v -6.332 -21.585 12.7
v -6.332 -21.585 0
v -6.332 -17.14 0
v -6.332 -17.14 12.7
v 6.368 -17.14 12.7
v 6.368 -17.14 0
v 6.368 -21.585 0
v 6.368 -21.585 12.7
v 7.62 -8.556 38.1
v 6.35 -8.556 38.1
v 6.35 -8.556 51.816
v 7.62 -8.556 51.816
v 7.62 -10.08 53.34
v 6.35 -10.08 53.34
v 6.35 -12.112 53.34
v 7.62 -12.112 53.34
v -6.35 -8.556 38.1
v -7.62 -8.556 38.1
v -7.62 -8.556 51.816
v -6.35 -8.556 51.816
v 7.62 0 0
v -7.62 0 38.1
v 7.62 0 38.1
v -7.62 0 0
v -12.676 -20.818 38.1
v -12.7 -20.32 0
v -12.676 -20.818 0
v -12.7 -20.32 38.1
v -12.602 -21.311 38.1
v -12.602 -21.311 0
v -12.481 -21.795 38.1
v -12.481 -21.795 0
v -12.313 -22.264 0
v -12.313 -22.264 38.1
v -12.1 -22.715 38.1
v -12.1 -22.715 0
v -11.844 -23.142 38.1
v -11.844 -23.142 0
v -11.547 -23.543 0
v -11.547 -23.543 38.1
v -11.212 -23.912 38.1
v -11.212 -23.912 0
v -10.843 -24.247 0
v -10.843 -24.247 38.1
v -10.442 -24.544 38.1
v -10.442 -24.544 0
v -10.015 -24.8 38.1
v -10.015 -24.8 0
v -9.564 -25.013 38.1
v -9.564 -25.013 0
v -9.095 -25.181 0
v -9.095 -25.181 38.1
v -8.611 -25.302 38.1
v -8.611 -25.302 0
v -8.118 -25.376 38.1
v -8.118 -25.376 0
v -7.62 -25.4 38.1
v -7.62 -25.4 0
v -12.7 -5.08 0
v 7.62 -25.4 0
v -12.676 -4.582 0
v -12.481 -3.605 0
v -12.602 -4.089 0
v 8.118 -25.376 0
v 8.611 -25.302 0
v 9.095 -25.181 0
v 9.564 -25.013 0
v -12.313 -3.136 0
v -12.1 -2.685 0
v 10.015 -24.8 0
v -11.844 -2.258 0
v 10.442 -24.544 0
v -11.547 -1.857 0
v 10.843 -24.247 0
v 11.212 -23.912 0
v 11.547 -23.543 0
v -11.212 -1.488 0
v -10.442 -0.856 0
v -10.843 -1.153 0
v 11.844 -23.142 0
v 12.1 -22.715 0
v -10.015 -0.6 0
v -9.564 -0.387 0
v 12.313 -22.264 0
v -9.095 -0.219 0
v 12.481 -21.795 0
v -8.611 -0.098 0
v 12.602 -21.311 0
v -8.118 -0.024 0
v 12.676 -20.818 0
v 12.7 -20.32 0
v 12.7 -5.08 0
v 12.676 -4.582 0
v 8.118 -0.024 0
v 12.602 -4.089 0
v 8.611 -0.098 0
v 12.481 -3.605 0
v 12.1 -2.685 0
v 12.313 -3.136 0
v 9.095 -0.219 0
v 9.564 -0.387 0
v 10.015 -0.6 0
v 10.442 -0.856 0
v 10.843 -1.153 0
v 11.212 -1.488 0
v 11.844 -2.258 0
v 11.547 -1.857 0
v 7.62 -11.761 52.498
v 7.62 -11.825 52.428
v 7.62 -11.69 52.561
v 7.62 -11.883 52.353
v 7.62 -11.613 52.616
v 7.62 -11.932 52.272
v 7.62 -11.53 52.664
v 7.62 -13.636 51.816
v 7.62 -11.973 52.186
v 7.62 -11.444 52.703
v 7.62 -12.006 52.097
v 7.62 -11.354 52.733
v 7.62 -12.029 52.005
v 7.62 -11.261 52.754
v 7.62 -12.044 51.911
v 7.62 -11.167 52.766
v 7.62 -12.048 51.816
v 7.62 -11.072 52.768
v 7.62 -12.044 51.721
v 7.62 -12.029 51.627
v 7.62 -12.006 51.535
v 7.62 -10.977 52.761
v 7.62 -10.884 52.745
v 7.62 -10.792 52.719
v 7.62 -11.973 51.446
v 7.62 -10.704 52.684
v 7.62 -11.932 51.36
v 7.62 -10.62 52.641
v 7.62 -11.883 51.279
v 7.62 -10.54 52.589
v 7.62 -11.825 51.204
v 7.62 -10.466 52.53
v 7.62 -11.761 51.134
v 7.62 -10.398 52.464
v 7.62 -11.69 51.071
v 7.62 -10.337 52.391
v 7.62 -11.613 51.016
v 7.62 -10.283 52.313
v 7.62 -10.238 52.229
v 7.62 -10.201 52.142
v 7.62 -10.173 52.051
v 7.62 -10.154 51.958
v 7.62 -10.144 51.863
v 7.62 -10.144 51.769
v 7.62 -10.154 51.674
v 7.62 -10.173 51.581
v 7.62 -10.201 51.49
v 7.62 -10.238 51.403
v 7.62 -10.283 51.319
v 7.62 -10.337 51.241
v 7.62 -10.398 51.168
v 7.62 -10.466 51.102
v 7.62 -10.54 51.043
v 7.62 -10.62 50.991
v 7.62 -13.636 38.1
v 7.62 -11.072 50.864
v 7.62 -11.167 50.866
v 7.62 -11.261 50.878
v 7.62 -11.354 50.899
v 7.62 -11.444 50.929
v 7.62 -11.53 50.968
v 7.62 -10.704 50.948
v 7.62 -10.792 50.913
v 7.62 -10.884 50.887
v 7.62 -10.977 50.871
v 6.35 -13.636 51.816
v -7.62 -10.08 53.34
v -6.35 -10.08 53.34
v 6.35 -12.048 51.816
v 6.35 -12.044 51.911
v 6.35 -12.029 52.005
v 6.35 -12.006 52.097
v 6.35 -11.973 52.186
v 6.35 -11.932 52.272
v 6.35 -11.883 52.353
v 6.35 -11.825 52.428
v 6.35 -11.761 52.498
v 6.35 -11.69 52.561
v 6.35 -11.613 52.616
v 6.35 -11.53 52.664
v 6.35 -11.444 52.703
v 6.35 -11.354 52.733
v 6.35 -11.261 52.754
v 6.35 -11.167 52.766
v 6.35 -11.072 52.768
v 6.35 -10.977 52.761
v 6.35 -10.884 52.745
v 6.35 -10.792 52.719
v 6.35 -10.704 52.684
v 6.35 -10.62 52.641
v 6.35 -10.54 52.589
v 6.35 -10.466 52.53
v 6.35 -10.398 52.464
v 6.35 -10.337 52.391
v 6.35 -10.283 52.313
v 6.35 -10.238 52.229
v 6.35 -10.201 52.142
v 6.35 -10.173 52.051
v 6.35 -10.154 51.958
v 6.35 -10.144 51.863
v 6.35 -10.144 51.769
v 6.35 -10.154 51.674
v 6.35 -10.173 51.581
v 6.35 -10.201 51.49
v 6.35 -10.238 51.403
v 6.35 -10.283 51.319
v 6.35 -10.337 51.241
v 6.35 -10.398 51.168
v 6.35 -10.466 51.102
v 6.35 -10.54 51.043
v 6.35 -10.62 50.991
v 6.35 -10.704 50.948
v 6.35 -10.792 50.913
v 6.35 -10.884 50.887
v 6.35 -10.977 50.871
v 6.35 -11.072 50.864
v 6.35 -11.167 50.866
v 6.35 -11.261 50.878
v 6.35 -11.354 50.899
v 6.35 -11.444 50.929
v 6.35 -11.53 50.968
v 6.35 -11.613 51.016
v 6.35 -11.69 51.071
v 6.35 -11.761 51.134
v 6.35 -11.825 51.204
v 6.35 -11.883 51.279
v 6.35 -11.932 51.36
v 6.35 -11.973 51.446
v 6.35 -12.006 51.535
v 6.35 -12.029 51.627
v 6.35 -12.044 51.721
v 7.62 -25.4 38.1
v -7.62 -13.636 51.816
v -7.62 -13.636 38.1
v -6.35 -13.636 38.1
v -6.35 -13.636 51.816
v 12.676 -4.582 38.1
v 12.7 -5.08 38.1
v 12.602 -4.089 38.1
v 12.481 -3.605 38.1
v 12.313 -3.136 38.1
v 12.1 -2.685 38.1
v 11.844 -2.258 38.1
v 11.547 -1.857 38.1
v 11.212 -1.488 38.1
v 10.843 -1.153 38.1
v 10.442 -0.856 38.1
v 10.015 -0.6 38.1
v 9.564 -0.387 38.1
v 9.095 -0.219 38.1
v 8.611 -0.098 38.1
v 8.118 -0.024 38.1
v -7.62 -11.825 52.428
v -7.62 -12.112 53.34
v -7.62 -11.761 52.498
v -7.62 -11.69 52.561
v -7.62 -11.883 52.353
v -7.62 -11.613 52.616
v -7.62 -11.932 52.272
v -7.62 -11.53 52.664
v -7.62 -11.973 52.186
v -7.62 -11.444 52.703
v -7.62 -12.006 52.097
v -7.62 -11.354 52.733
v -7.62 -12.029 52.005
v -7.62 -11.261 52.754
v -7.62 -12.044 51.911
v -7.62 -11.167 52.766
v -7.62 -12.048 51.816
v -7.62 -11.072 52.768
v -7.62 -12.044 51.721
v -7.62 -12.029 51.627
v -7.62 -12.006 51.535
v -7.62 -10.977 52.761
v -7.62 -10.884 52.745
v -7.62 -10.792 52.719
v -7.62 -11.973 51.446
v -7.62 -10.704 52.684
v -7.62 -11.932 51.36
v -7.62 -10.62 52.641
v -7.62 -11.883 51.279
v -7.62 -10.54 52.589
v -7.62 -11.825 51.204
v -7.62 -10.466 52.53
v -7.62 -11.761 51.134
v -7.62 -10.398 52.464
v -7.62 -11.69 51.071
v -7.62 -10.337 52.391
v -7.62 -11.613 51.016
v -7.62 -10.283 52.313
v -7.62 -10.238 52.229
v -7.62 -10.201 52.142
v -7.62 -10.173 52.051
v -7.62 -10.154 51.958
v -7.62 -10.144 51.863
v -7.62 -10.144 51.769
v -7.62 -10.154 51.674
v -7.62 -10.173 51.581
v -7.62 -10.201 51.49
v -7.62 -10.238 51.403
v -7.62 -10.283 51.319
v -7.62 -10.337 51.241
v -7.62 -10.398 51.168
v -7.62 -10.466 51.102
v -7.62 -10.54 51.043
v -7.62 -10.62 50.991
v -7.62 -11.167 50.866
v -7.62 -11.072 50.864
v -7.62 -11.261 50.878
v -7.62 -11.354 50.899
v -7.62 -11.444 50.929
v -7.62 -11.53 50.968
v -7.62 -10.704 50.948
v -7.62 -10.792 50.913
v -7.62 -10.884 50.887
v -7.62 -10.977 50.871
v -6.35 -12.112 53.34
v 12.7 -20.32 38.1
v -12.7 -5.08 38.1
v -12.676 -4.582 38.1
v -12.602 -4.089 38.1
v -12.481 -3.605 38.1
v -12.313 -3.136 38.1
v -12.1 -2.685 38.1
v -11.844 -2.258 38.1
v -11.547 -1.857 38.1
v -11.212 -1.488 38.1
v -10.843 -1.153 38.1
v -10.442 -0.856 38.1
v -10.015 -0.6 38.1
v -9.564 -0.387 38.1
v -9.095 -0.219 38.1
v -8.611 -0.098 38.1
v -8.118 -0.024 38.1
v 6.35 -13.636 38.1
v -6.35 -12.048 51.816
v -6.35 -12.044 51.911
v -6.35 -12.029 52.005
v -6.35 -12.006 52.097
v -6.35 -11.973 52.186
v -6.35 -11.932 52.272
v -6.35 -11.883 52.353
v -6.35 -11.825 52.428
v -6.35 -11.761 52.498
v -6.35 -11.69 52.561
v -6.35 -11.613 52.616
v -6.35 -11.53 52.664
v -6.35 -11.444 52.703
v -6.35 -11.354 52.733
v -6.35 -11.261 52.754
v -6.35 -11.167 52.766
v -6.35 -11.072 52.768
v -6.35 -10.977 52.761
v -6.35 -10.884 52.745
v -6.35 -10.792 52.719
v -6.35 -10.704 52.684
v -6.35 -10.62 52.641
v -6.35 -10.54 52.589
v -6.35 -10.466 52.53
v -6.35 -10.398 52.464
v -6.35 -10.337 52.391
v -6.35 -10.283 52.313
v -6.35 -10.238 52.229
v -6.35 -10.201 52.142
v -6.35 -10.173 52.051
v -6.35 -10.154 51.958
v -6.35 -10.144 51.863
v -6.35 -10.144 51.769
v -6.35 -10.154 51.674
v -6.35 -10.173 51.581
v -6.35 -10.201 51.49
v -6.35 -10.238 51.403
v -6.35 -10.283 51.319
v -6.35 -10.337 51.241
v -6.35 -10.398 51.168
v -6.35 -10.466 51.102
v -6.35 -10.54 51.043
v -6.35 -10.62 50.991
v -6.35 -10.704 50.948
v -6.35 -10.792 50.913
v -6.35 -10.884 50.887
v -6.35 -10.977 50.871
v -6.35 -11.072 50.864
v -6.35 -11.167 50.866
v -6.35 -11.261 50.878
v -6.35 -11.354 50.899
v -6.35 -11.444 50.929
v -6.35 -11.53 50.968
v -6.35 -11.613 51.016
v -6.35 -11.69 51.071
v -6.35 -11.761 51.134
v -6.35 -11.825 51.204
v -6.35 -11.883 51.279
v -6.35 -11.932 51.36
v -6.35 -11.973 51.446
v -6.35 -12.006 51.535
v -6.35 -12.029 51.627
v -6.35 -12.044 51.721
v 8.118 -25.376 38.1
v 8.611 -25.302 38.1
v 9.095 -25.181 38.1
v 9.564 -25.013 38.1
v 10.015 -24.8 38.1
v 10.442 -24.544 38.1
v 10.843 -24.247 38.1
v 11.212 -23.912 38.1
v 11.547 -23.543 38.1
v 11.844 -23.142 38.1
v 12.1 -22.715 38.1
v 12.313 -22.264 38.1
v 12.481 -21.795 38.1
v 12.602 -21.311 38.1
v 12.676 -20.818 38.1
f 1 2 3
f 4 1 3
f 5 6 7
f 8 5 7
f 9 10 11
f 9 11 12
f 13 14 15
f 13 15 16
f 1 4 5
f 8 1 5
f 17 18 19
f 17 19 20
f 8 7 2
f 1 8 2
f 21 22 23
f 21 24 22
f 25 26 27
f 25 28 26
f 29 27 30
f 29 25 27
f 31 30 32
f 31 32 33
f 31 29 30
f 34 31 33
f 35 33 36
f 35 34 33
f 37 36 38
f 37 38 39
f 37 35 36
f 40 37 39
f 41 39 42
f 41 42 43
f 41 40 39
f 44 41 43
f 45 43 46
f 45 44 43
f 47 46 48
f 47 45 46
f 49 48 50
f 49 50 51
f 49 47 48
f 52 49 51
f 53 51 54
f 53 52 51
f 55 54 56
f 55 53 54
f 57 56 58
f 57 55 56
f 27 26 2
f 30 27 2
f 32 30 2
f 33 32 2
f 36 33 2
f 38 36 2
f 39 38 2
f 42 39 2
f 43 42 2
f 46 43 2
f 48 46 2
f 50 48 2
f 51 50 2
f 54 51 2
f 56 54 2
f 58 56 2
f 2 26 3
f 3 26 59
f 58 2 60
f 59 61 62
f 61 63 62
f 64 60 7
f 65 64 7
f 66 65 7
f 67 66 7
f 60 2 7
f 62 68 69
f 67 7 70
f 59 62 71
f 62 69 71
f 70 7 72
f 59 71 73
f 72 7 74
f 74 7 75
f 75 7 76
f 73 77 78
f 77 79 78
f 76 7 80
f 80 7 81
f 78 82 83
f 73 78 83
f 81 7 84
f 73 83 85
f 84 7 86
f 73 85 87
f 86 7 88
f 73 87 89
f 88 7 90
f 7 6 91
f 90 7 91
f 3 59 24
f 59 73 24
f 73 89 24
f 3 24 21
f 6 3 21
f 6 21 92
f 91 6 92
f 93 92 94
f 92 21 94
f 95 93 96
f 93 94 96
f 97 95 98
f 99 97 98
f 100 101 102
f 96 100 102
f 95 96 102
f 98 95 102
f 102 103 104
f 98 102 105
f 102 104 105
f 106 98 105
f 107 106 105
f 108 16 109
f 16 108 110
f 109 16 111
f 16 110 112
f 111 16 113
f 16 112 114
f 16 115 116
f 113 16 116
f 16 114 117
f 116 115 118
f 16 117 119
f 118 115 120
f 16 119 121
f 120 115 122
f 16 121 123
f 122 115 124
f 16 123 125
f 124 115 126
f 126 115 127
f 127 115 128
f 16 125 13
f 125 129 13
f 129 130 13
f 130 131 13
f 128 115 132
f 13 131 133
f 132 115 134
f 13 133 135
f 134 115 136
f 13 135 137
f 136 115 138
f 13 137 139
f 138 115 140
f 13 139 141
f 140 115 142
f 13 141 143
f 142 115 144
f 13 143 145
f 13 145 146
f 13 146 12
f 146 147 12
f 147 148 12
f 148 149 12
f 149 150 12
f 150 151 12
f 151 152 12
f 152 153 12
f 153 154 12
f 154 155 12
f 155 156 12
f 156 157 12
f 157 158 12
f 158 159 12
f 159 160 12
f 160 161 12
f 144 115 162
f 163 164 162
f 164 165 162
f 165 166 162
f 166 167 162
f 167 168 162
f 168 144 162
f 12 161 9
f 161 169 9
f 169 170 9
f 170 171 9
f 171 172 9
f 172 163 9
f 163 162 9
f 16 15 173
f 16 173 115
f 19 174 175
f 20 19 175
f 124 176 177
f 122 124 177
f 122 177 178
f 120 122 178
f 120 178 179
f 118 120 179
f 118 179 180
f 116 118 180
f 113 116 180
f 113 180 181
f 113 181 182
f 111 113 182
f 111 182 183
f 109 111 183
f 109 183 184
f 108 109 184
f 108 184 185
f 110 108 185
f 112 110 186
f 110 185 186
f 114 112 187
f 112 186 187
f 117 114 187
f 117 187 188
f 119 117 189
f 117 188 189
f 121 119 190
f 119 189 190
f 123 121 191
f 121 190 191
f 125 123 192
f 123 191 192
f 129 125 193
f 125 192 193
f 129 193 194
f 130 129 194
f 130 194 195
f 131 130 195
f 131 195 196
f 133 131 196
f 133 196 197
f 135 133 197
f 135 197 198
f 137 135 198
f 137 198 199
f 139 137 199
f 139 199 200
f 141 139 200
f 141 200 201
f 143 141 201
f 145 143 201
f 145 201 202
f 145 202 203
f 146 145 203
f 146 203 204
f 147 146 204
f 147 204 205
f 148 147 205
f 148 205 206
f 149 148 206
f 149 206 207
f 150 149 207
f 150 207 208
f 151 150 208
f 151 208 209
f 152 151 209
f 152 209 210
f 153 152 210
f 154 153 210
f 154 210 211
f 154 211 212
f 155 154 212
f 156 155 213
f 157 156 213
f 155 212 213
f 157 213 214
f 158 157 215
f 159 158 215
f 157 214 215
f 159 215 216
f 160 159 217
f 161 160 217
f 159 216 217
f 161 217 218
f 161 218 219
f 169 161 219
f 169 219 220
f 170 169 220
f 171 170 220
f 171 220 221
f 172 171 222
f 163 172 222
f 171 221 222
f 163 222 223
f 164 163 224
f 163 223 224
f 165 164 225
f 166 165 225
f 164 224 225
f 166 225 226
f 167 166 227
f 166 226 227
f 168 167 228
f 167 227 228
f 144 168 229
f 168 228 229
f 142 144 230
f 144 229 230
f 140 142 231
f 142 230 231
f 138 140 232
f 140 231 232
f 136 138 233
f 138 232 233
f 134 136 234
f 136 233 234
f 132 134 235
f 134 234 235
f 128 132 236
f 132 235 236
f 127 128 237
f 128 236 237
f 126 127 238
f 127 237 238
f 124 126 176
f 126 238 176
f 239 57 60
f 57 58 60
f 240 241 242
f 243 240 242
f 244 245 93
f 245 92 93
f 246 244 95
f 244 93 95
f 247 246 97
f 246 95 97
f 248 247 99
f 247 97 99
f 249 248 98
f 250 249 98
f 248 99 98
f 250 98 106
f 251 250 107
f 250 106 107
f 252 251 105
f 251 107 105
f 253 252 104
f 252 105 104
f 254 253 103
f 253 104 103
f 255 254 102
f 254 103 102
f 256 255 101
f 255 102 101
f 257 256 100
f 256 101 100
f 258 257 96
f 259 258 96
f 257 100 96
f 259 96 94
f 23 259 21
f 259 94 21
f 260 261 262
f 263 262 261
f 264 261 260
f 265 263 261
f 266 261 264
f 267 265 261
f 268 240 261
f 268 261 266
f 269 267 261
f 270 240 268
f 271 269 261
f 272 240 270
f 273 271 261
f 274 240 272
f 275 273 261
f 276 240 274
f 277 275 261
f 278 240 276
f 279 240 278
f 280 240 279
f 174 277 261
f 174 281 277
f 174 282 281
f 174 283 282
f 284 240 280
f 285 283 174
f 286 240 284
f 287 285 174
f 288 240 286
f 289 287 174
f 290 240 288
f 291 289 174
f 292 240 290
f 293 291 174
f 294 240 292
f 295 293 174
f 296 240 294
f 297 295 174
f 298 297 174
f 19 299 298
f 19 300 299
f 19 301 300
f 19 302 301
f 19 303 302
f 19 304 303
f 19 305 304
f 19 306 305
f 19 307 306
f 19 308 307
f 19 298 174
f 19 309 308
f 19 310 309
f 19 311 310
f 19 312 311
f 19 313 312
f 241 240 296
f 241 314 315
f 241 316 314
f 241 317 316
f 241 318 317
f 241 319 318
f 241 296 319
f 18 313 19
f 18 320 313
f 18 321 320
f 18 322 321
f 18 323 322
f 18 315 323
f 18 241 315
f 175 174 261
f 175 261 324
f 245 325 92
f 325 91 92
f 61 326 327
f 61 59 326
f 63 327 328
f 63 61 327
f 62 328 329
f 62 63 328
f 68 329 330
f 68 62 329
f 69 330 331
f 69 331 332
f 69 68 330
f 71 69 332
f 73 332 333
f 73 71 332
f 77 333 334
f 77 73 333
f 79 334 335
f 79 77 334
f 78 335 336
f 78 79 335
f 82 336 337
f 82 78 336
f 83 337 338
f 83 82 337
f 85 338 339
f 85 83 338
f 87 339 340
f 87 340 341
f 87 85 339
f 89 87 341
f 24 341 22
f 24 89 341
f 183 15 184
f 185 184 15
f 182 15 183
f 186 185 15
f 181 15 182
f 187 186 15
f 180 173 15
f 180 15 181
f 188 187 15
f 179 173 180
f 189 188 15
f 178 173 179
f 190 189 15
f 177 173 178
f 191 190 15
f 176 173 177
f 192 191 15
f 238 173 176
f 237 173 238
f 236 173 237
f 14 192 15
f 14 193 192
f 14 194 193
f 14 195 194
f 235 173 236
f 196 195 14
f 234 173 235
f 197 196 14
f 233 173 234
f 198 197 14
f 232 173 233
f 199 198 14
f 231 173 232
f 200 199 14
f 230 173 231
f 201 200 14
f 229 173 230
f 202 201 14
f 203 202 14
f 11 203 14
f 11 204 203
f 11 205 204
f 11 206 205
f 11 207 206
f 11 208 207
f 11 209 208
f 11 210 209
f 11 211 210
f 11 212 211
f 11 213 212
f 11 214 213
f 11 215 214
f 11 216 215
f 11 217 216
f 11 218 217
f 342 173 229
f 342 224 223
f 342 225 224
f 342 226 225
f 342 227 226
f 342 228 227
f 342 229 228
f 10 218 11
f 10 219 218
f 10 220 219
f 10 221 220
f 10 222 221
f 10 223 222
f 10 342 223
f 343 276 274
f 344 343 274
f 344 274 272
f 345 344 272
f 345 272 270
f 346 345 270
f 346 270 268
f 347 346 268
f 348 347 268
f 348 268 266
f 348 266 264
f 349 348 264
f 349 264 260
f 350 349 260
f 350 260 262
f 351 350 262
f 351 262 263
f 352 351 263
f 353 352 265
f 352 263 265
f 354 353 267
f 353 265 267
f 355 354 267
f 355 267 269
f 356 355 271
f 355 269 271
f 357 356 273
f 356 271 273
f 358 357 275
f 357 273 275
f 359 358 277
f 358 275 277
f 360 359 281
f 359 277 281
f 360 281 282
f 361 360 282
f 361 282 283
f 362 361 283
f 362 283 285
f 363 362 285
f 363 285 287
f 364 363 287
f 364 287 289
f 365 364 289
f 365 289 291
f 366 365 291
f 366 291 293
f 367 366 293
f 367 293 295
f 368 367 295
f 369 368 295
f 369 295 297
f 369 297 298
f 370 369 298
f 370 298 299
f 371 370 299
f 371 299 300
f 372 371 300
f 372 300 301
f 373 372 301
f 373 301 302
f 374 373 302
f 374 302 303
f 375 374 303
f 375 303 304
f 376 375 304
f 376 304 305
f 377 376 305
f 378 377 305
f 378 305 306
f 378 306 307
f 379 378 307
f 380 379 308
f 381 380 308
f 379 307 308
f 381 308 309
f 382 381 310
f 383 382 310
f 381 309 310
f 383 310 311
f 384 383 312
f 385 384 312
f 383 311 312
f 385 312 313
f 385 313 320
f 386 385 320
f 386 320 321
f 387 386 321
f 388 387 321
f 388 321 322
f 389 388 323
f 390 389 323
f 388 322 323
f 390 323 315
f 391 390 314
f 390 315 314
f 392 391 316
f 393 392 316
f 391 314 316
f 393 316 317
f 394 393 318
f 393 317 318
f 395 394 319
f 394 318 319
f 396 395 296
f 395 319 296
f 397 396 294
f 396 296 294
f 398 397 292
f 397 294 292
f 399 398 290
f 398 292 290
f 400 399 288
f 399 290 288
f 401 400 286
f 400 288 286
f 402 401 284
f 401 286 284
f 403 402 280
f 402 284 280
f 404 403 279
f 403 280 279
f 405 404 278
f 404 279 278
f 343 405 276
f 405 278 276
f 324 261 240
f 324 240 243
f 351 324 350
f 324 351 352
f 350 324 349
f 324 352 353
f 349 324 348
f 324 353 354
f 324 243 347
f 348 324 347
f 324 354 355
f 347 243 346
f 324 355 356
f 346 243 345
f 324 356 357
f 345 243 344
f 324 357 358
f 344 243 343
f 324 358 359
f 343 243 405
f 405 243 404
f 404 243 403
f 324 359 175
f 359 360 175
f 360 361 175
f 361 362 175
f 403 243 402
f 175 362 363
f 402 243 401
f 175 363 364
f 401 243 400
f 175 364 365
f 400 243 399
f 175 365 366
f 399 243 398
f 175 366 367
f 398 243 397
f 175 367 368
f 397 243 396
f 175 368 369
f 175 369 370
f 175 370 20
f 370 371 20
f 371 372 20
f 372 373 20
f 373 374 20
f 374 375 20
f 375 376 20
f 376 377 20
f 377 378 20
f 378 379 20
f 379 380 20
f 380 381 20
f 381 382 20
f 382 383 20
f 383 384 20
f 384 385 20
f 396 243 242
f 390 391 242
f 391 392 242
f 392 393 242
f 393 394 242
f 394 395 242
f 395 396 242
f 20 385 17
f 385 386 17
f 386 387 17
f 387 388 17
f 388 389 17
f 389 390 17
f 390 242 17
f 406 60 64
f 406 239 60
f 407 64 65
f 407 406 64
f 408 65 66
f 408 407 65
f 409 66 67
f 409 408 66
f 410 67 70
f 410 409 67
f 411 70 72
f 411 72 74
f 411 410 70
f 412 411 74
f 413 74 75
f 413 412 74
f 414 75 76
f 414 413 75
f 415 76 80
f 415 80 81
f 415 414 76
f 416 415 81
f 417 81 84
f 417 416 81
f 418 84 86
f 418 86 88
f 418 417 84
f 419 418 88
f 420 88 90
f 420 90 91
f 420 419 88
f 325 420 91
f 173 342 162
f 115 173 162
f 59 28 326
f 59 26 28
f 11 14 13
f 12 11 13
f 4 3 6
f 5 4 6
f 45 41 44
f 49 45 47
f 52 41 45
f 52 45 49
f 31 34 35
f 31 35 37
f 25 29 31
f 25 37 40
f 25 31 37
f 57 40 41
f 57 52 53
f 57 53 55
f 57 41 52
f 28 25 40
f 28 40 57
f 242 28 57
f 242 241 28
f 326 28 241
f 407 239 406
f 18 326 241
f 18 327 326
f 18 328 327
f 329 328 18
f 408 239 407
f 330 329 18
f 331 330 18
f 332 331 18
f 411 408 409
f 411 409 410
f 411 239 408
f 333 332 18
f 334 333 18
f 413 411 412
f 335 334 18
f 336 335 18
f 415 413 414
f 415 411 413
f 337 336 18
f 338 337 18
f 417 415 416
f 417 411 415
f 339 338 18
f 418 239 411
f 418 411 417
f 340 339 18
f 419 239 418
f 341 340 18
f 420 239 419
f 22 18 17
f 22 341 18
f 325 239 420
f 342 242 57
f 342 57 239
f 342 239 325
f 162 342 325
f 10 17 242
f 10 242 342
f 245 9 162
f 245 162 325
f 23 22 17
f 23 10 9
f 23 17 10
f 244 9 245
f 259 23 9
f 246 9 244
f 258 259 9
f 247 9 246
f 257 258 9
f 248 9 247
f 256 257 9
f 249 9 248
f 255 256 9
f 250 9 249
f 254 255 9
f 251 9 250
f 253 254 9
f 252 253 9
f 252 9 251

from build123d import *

# Parameters (mm, degrees)
F1_DEPTH = 12.7
F2_W     = 25.4
F2_H     = 25.4
F3_DEPTH = 25.4
F4_R     = 5.08
F5_W     = 1.27
F5_H     = 5.08
F6_DEPTH = 15.24
F7_SIZE  = 1.524
F8_R     = 0.9525
F9_DEPTH = 127


with BuildPart() as f1:
    # F0 (on Top) → F1 (new body)
    with BuildSketch(Plane.XY):
        Polygon((-12.7, -25.4), (0, -25.4), (12.7, -25.4), (12.7, 0), (-12.7, 0), align=None)
        Polygon((6.368273, -21.585433), (0.018273, -21.585433), (-6.331727, -21.585433), (-6.331727, -17.140433), (6.368273, -17.140433), align=None, mode=Mode.SUBTRACT)
    extrude(amount=F1_DEPTH)

    # F2 (on face) → F3 (join)
    with BuildSketch(Plane.XY.offset(12.7)):
        with Locations((0, -12.7)):
            Rectangle(F2_W, F2_H)
    extrude(amount=F3_DEPTH)

    # F4
    f4_edges = [f1.edges().sort_by_distance(p)[0] for p in [
        (-12.7, -25.4, 19.05),
        (12.7, -25.4, 19.05),
        (-12.7, 0, 19.05),
        (12.7, 0, 19.05),
    ]]
    fillet(f4_edges, radius=F4_R)

    # F5 (on face) → F6 (join)
    with BuildSketch(Plane.XY.offset(38.1)):
        with Locations((-6.985, -11.095791)):
            Rectangle(F5_W, F5_H)
        with Locations((6.985, -11.095791)):
            Rectangle(F5_W, F5_H)
    extrude(amount=F6_DEPTH)

    # F7
    f7_edges = [f1.edges().sort_by_distance(p)[0] for p in [
        (-6.985, -13.635791, 53.34),
        (6.985, -13.635791, 53.34),
        (-6.985, -8.555791, 53.34),
        (6.985, -8.555791, 53.34),
    ]]
    chamfer(f7_edges, length=F7_SIZE)

    # F8 (on face) → F9 (cut)
    with BuildSketch(Plane(origin=(-7.62, 0, 0), x_dir=(0, -1, 0), z_dir=(-1, 0, 0))):
        with Locations((11.095791, 51.816)):
            Circle(F8_R)
    extrude(amount=-F9_DEPTH, mode=Mode.SUBTRACT)


solid = f1.part
